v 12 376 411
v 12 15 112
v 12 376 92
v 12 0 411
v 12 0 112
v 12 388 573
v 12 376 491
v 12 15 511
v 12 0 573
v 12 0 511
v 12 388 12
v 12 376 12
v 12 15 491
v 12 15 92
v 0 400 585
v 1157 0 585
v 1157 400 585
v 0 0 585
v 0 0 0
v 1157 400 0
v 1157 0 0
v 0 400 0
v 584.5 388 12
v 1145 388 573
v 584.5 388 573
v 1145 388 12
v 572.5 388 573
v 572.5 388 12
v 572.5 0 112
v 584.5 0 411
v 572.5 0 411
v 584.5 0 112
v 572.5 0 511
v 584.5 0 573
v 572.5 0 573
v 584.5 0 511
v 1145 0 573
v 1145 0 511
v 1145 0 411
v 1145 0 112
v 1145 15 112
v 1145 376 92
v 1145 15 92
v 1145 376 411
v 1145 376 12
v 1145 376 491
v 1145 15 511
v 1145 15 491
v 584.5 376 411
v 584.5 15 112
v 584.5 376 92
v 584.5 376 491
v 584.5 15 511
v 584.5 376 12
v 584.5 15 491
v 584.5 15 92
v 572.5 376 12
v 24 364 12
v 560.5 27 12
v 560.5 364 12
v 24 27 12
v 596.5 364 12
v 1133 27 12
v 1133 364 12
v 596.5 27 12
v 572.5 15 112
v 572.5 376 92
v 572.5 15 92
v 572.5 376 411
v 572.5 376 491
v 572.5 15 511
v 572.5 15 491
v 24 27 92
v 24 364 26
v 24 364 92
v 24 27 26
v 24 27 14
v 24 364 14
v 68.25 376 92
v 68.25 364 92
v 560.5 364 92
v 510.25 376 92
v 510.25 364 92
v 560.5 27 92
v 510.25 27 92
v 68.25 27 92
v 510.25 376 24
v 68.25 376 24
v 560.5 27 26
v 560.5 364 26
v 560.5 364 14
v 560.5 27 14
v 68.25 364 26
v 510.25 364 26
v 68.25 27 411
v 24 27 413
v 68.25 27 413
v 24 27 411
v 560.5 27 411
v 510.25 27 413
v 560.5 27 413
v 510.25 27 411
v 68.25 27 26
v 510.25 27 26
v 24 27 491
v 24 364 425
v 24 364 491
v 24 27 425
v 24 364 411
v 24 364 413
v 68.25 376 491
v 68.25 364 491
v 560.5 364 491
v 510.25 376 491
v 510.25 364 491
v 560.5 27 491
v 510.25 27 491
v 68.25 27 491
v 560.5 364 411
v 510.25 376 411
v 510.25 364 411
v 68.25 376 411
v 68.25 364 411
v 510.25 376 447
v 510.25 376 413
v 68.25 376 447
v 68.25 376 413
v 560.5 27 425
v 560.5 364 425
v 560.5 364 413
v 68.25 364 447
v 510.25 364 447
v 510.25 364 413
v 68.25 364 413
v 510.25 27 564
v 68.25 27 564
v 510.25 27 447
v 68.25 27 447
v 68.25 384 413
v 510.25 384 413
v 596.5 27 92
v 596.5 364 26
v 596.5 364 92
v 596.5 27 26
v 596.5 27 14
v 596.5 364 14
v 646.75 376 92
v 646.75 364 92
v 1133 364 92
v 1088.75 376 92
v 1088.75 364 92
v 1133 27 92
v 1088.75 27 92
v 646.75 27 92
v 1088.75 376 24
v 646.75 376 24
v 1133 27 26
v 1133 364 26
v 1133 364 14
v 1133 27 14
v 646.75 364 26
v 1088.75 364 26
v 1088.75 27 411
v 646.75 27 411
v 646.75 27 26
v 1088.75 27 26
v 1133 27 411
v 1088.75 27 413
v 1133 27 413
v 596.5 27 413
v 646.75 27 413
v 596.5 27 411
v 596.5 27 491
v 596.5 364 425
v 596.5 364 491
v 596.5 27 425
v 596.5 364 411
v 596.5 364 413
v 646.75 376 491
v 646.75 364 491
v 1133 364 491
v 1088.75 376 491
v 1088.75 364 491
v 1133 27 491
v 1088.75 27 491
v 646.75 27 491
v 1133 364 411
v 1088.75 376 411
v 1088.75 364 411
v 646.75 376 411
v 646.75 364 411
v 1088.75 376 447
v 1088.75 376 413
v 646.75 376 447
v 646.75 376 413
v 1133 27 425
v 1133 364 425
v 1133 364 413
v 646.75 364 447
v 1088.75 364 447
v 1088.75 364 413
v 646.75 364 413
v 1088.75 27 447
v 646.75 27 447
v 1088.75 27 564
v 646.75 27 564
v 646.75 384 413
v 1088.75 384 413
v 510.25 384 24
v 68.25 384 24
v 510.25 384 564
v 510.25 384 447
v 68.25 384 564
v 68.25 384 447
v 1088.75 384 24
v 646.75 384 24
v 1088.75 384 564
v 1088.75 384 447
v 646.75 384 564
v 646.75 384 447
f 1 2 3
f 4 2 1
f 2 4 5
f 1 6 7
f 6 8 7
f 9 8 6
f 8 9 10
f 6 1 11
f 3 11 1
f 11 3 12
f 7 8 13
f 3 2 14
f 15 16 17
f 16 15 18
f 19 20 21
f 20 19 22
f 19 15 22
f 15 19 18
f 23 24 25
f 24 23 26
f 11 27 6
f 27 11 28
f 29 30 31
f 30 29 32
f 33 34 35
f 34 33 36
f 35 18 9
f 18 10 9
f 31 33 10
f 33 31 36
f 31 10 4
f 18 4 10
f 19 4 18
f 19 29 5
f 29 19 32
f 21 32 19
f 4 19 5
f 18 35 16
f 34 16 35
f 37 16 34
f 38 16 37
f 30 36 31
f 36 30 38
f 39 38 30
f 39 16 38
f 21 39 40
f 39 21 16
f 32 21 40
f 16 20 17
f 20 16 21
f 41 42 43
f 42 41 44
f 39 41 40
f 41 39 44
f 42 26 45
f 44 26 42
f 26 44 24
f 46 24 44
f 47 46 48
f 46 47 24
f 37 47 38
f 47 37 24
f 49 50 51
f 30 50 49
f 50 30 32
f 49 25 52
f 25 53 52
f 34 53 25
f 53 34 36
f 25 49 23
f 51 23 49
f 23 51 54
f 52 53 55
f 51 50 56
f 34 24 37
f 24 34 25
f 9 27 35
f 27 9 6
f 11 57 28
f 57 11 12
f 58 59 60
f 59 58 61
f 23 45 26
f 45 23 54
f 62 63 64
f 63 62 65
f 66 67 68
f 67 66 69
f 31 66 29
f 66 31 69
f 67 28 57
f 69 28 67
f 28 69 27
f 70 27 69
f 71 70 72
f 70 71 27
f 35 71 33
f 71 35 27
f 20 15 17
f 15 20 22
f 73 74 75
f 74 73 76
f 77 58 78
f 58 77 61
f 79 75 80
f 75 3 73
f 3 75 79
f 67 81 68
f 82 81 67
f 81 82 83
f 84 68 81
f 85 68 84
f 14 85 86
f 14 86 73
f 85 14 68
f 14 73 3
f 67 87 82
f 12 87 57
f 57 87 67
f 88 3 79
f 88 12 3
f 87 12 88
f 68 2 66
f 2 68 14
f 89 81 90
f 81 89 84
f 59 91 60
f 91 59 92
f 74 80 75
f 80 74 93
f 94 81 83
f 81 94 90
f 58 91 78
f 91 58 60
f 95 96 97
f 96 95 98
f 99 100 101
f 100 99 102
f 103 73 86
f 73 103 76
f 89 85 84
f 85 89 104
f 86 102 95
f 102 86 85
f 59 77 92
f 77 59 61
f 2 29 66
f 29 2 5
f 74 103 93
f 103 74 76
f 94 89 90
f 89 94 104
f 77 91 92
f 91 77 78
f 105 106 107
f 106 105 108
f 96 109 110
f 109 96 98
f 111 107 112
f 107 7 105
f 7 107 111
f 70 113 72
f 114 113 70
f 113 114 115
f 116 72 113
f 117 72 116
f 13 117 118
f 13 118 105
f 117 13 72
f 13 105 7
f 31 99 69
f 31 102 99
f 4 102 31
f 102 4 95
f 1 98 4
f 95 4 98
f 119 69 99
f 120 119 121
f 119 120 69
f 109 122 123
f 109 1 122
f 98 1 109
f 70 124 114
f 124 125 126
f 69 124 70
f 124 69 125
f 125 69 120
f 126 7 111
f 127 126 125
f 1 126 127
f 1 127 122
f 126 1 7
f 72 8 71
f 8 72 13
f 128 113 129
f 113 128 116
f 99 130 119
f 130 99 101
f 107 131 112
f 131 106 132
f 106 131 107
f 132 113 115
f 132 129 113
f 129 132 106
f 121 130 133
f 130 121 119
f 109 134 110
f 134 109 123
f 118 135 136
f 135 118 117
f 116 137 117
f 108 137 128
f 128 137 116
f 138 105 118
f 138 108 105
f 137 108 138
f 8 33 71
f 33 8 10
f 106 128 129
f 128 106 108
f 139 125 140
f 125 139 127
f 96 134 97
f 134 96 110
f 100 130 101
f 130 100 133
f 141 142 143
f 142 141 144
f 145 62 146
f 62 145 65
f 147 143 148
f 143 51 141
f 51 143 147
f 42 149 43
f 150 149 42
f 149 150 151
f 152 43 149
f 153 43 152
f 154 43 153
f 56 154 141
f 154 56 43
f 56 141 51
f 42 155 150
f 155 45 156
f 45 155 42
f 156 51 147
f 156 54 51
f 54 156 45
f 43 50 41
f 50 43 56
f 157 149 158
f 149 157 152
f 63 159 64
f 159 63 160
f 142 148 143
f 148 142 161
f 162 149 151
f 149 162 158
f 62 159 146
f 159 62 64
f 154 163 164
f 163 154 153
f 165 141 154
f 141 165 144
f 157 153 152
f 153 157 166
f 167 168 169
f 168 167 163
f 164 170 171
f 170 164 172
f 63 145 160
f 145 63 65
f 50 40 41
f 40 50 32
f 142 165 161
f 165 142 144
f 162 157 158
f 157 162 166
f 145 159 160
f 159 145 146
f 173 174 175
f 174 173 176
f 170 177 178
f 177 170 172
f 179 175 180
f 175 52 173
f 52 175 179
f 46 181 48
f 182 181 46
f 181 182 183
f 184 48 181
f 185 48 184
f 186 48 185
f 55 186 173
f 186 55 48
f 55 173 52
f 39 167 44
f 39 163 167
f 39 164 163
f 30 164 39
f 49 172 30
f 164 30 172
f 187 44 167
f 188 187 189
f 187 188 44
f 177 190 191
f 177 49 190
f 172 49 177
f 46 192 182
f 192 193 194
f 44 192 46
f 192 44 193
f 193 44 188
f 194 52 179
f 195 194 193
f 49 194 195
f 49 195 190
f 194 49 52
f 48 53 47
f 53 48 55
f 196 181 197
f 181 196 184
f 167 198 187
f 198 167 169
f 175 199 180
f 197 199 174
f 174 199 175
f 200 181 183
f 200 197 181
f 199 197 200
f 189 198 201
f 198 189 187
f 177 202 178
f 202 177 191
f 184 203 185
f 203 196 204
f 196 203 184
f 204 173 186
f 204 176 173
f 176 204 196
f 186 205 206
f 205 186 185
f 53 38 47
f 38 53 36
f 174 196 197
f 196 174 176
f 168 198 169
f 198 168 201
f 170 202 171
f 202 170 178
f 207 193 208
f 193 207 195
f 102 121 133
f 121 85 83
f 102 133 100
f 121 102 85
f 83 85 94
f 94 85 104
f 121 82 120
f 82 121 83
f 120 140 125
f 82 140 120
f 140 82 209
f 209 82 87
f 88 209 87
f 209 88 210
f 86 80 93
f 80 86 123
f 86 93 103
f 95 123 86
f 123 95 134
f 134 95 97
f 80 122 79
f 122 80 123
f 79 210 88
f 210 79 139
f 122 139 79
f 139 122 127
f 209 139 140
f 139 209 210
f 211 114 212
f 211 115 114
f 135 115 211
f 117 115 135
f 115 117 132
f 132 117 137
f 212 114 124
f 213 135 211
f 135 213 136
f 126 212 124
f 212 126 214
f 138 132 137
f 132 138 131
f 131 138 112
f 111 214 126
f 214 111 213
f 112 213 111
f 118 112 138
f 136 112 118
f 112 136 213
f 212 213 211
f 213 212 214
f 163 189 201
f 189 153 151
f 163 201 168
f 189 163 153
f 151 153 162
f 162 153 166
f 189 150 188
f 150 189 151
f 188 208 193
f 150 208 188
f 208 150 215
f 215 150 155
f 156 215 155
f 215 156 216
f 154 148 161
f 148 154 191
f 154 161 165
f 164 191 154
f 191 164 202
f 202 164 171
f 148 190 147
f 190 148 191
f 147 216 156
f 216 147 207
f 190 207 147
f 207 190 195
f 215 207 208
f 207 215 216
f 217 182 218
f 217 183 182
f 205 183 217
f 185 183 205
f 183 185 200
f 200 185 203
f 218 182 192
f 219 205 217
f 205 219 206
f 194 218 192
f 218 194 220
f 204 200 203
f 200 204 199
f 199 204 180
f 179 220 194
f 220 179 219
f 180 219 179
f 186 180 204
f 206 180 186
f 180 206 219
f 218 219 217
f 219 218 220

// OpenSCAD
// file: storage-unit.scad
/*

    Storage Unit
    
    By Anton Augustsson


*/



module storageUnit (
    thickness,
    length,
    width,
    height,
    x,y,z
    ){
/*
    ---------- Local varibles ---------- 
*/


/*
    ---------- Code ---------- 
*/

translate([
    x,
    y,
    z]) 
union () {

// Left
color("Wheat")
translate([
    0,
    0,
    0]) 
cube(size = [
    thickness,
    length-thickness,
    height]);

// Right
color("Wheat")
translate([
    width-thickness,
    0,
    0]) 
cube(size = [
    thickness,
    length-thickness,
    height]);


// Divider
color("Wheat")
translate([
    (width-thickness)/2,
    0,
    thickness]) 
cube(size = [
    thickness,
    length-thickness,
    height-thickness*2]);
    
    
// Back
color("Wheat")
translate([
    0,
    length-thickness,
    0]) 
cube(size = [
    width,
    thickness,
    height]);

// Bottom 
color("Wheat")
translate([
    thickness,
    0,
    0]) 
cube(size = [
    width-thickness*2,
    length-thickness,
    thickness]);

// Top
color("BurlyWood")
translate([
    thickness,
    0,
    height-thickness]) 
cube(size = [
    width-thickness*2,
    length-thickness,
    thickness]);    


}}
    
/*
    ---------- Example ---------- 
*/


thickness= 12;

length = 500;
width  = 600;
height = 400;

x=0;
y=0;
z=0;
yRotate=0;

storageUnit (
    thickness,
    length,
    width,
    height,
    x,y,z
    );
// file: sliding-shelf.scad
/*

    Sliding Shelf
    
    By Anton Augustsson


*/

// use dovtail library

module slidingShelf (
    thicknessBottom,
    thicknessSide,
    thicknessFront,
    lenghtShelf,
    widthShelf,
    heightShelf,
    xShelf,yShelf,zShelf,
    yRotate
    ){
/*
    ---------- Local varibles ---------- 
*/

length = lenghtShelf;
width  = widthShelf;
height = 100;
heightSide = height-20;

x=xShelf;
y=yShelf;
z=zShelf;

/*
    ---------- Code ---------- 
*/

translate([
    x,
    y,
    z]) 
union () {

// Left
color("Wheat")
translate([
    0,
    thicknessFront,
    0]) 
cube(size = [
    thicknessSide,
    length-thicknessFront,
    heightSide]);

// Right
color("Wheat")
translate([
    width-thicknessSide,
    thicknessFront,
    0]) 
cube(size = [
    thicknessSide,
    length-thicknessFront,
    heightSide]);
    
// Back
color("Wheat")
translate([
    thicknessSide,
    length-thicknessSide,
    0]) 
cube(size = [
    width-thicknessSide*2,
    thicknessSide,
    heightSide]);

// Front
color("BurlyWood")
translate([
    thicknessSide,
    thicknessFront,
    0]) 
cube(size = [
    width-thicknessSide*2,
    thicknessSide,
    heightSide]);    

// Front face
color("BurlyWood")
translate([
    0,
    0,
    0]) 
cube(size = [
    width,
    thicknessFront,
    height]);    

// Bottom 
color("Wheat")
translate([
    thicknessSide,
    thicknessFront+thicknessSide,
    2]) 
cube(size = [
    width-thicknessSide*2,
    length-thicknessFront-thicknessSide*2,
    thicknessBottom]);

}}
    
/*
    ---------- Example ---------- 
*/


thicknessBottom = 12;
thicknessSide   = 12;
thicknessFront  = 15;

length = 500;
width  = 600;
height = 100;


x=0;
y=0;
z=0;
yRotate=0;

slidingShelf  (
    thicknessBottom,
    thicknessSide,
    thicknessFront,
    length,
    width,
    height,
    x,y,z,
    yRotate
    );
// file: simple-drawer.scad
/*

    Simple Drawer
    
    By Anton Augustsson


*/



module simpleDrawer (
    thicknessBottom,
    thicknessSide,
    thicknessFront,
    lenghtDrawer,
    widthDrawer,
    heightDrawer,
    xDrawer,yDrawer,zDrawer
    ){
/*
    ---------- Local varibles ---------- 
*/

length = lenghtDrawer;
width  = widthDrawer;
height = heightDrawer;
heightSide = height/2;

x=xDrawer;
y=yDrawer;
z=zDrawer;

/*
    ---------- Code ---------- 
*/

translate([
    x,
    y,
    z]) 
difference () {
union () {

// Left
color("Wheat")
translate([
    0,
    thicknessFront,
    0]) 
cube(size = [
    thicknessSide,
    length-thicknessFront,
    heightSide]);

// Right
color("Wheat")
translate([
    width-thicknessSide,
    thicknessFront,
    0]) 
cube(size = [
    thicknessSide,
    length-thicknessFront,
    heightSide]);
    
// Back
color("Wheat")
translate([
    thicknessSide,
    length-thicknessSide,
    0]) 
cube(size = [
    width-thicknessSide*2,
    thicknessSide,
    heightSide]);

// Front
color("BurlyWood")
translate([
    thicknessSide,
    thicknessFront,
    0]) 
cube(size = [
    width-thicknessSide*2,
    thicknessSide,
    heightSide]);    

// Front face
color("BurlyWood")
translate([
    0,
    0,
    0]) 
cube(size = [
    width,
    thicknessFront,
    height]);    

// Bottom 
color("Wheat")
translate([
    thicknessSide,
    thicknessFront+thicknessSide,
    2]) 
cube(size = [
    width-thicknessSide*2,
    length-thicknessFront-thicknessSide*2,
    thicknessBottom]);

}


translate([
    width/2,                   
    -1,   
    height/4*3
    ])  
rotate([270,0,0])
cylinder(
    h = thicknessFront+2,    
    r = 10        
    );      

}}
    
/*
    ---------- Example ---------- 
*/


thicknessBottom = 12;
thicknessSide   = 12;
thicknessFront  = 15;

length = 500;
width  = 600;
height = 100;


x=0;
y=0;
z=0;
yRotate=0;

simpleDrawer (
    thicknessBottom,
    thicknessSide,
    thicknessFront,
    length,
    width,
    height,
    x,y,z
    );
// main file
/*

    Power Tool Storage
    
    By Anton Augustsson


*/

use <simple-drawer.scad>;
use <sliding-shelf.scad>;
use <storage-unit.scad>;

module powerToolStorage (
    thickness,
    length,
    width,
    height,
    x,y,z
    ){
/*
    ---------- Local varibles ---------- 
*/


storageUnitThickness = thickness;
storageUnitWidth     = width;
storageUnitLength    = length;
storageUnitHeight    = height;

thicknessBottom = thickness;
thicknessSide   = thickness;
thicknessFront  = 15;
        
slidingShelfWidth  = (length
        -thickness*2)/2-
        thickness/2;
slidingShelfLength = width
        -thickness*2;
slidingShelfHeight = height/3*2
        +9;

/*
    ---------- Code ---------- 
*/

translate([
    x,
    y,
    z]) 
union () {

storageUnit (
    storageUnitThickness,
    storageUnitWidth,
    storageUnitLength,
    storageUnitHeight,
    0,0,0
    );

// Left Lower
slidingShelf  (
    thicknessBottom,
    thicknessSide,
    thicknessFront,
    slidingShelfLength,
    slidingShelfWidth,
    slidingShelfHeight,
    thickness,0,thickness
    );
    
// Left Upper
slidingShelf  (
    thicknessBottom,
    thicknessSide,
    thicknessFront,
    slidingShelfLength,
    slidingShelfWidth,
    slidingShelfHeight,
    thickness,
    0,
    thickness+slidingShelfHeight
    );

// Right Lower
slidingShelf  (
    thicknessBottom,
    thicknessSide,
    thicknessFront,
    slidingShelfLength,
    slidingShelfWidth,
    slidingShelfHeight,
    thickness*2
    +slidingShelfWidth,
    0,
    thickness
    );
    
// Right Upper
slidingShelf  (
    thicknessBottom,
    thicknessSide,
    thicknessFront,
    slidingShelfLength,
    slidingShelfWidth,
    slidingShelfHeight,
    thickness*2
    +slidingShelfWidth,
    0,
    thickness+slidingShelfHeight
    );


color("Navy")
union () {
// Left lower storage blocks
translate([
    length/4-442/2,
    thicknessFront+thicknessSide,
    thickness+thicknessBottom]) 
cube(size = [
    442,
    357,
    389]);
    
// Left Upper storage blocks
translate([
    length/4-442/2,
    thicknessFront+thicknessSide,
    (thickness+thicknessBottom)*2
    +slidingShelfHeight]) 
cube(size = [
    442,
    357,
    117]);

// Left lower storage blocks
translate([
    length/4*3-442/2,
    thicknessFront+thicknessSide,
    thickness+thicknessBottom]) 
cube(size = [
    442,
    357,
    389]);
    
// Left Upper storage blocks
translate([
    length/4*3-442/2,
    thicknessFront+thicknessSide,
    (thickness+thicknessBottom)*2
    +slidingShelfHeight]) 
cube(size = [
    442,
    357,
    117]);
}

}}
    
/*
    ---------- Example ---------- 
*/


standardSheathingWidth = 1220; 
standardSheathingLength = 2440;

mdfTopThickness = 19;
plywoodTopThickness = 12;

// Side protection for ply and mdf
edgeTopThickness = 20; 
edgeTopWidth = 167;
edgeTopLengthX = standardSheathingLength
    +2*edgeTopThickness;
edgeTopLengthY = standardSheathingWidth
    +2*edgeTopThickness;

// 4 list betweend mdf and ply (Pine)
listTopThickness = 20; 
listTopWidth = 80;
listTopLengthX = standardSheathingLength/4
    -listTopThickness;
listTopLengthY = standardSheathingWidth;

// 6 legs (Pine)
legLength = 900
    -plywoodTopThickness
    -mdfTopThickness
    -listTopWidth;
legWidth = 69;
legThickness = 42;

// 3 bottom list (Pine)
listBottomThickness = 20; 
listBottomWidth1 = 60;
listBottomWidth2 = listBottomWidth1
    -plywoodTopThickness;
listBottomLengthX = standardSheathingLength;
listBottomLengthY = standardSheathingWidth;
listBottomLengthY2 = standardSheathingWidth
    +listBottomThickness*2;
bottomHeight = 100;

storageUnitLength=standardSheathingLength/2
    -legThickness*3/2;
storageUnitWidth=400;  
storageUnitHeight=(900-edgeTopWidth)
    -(bottomHeight+listBottomWidth2);
storageUnitThickness=12;


thickness = storageUnitThickness;

length = storageUnitLength;
width  = storageUnitWidth;
height = storageUnitHeight;


x=0;
y=0;
z=0;
yRotate=0;

powerToolStorage (
    thickness,
    length,
    width,
    height,
    x,y,z
    );
